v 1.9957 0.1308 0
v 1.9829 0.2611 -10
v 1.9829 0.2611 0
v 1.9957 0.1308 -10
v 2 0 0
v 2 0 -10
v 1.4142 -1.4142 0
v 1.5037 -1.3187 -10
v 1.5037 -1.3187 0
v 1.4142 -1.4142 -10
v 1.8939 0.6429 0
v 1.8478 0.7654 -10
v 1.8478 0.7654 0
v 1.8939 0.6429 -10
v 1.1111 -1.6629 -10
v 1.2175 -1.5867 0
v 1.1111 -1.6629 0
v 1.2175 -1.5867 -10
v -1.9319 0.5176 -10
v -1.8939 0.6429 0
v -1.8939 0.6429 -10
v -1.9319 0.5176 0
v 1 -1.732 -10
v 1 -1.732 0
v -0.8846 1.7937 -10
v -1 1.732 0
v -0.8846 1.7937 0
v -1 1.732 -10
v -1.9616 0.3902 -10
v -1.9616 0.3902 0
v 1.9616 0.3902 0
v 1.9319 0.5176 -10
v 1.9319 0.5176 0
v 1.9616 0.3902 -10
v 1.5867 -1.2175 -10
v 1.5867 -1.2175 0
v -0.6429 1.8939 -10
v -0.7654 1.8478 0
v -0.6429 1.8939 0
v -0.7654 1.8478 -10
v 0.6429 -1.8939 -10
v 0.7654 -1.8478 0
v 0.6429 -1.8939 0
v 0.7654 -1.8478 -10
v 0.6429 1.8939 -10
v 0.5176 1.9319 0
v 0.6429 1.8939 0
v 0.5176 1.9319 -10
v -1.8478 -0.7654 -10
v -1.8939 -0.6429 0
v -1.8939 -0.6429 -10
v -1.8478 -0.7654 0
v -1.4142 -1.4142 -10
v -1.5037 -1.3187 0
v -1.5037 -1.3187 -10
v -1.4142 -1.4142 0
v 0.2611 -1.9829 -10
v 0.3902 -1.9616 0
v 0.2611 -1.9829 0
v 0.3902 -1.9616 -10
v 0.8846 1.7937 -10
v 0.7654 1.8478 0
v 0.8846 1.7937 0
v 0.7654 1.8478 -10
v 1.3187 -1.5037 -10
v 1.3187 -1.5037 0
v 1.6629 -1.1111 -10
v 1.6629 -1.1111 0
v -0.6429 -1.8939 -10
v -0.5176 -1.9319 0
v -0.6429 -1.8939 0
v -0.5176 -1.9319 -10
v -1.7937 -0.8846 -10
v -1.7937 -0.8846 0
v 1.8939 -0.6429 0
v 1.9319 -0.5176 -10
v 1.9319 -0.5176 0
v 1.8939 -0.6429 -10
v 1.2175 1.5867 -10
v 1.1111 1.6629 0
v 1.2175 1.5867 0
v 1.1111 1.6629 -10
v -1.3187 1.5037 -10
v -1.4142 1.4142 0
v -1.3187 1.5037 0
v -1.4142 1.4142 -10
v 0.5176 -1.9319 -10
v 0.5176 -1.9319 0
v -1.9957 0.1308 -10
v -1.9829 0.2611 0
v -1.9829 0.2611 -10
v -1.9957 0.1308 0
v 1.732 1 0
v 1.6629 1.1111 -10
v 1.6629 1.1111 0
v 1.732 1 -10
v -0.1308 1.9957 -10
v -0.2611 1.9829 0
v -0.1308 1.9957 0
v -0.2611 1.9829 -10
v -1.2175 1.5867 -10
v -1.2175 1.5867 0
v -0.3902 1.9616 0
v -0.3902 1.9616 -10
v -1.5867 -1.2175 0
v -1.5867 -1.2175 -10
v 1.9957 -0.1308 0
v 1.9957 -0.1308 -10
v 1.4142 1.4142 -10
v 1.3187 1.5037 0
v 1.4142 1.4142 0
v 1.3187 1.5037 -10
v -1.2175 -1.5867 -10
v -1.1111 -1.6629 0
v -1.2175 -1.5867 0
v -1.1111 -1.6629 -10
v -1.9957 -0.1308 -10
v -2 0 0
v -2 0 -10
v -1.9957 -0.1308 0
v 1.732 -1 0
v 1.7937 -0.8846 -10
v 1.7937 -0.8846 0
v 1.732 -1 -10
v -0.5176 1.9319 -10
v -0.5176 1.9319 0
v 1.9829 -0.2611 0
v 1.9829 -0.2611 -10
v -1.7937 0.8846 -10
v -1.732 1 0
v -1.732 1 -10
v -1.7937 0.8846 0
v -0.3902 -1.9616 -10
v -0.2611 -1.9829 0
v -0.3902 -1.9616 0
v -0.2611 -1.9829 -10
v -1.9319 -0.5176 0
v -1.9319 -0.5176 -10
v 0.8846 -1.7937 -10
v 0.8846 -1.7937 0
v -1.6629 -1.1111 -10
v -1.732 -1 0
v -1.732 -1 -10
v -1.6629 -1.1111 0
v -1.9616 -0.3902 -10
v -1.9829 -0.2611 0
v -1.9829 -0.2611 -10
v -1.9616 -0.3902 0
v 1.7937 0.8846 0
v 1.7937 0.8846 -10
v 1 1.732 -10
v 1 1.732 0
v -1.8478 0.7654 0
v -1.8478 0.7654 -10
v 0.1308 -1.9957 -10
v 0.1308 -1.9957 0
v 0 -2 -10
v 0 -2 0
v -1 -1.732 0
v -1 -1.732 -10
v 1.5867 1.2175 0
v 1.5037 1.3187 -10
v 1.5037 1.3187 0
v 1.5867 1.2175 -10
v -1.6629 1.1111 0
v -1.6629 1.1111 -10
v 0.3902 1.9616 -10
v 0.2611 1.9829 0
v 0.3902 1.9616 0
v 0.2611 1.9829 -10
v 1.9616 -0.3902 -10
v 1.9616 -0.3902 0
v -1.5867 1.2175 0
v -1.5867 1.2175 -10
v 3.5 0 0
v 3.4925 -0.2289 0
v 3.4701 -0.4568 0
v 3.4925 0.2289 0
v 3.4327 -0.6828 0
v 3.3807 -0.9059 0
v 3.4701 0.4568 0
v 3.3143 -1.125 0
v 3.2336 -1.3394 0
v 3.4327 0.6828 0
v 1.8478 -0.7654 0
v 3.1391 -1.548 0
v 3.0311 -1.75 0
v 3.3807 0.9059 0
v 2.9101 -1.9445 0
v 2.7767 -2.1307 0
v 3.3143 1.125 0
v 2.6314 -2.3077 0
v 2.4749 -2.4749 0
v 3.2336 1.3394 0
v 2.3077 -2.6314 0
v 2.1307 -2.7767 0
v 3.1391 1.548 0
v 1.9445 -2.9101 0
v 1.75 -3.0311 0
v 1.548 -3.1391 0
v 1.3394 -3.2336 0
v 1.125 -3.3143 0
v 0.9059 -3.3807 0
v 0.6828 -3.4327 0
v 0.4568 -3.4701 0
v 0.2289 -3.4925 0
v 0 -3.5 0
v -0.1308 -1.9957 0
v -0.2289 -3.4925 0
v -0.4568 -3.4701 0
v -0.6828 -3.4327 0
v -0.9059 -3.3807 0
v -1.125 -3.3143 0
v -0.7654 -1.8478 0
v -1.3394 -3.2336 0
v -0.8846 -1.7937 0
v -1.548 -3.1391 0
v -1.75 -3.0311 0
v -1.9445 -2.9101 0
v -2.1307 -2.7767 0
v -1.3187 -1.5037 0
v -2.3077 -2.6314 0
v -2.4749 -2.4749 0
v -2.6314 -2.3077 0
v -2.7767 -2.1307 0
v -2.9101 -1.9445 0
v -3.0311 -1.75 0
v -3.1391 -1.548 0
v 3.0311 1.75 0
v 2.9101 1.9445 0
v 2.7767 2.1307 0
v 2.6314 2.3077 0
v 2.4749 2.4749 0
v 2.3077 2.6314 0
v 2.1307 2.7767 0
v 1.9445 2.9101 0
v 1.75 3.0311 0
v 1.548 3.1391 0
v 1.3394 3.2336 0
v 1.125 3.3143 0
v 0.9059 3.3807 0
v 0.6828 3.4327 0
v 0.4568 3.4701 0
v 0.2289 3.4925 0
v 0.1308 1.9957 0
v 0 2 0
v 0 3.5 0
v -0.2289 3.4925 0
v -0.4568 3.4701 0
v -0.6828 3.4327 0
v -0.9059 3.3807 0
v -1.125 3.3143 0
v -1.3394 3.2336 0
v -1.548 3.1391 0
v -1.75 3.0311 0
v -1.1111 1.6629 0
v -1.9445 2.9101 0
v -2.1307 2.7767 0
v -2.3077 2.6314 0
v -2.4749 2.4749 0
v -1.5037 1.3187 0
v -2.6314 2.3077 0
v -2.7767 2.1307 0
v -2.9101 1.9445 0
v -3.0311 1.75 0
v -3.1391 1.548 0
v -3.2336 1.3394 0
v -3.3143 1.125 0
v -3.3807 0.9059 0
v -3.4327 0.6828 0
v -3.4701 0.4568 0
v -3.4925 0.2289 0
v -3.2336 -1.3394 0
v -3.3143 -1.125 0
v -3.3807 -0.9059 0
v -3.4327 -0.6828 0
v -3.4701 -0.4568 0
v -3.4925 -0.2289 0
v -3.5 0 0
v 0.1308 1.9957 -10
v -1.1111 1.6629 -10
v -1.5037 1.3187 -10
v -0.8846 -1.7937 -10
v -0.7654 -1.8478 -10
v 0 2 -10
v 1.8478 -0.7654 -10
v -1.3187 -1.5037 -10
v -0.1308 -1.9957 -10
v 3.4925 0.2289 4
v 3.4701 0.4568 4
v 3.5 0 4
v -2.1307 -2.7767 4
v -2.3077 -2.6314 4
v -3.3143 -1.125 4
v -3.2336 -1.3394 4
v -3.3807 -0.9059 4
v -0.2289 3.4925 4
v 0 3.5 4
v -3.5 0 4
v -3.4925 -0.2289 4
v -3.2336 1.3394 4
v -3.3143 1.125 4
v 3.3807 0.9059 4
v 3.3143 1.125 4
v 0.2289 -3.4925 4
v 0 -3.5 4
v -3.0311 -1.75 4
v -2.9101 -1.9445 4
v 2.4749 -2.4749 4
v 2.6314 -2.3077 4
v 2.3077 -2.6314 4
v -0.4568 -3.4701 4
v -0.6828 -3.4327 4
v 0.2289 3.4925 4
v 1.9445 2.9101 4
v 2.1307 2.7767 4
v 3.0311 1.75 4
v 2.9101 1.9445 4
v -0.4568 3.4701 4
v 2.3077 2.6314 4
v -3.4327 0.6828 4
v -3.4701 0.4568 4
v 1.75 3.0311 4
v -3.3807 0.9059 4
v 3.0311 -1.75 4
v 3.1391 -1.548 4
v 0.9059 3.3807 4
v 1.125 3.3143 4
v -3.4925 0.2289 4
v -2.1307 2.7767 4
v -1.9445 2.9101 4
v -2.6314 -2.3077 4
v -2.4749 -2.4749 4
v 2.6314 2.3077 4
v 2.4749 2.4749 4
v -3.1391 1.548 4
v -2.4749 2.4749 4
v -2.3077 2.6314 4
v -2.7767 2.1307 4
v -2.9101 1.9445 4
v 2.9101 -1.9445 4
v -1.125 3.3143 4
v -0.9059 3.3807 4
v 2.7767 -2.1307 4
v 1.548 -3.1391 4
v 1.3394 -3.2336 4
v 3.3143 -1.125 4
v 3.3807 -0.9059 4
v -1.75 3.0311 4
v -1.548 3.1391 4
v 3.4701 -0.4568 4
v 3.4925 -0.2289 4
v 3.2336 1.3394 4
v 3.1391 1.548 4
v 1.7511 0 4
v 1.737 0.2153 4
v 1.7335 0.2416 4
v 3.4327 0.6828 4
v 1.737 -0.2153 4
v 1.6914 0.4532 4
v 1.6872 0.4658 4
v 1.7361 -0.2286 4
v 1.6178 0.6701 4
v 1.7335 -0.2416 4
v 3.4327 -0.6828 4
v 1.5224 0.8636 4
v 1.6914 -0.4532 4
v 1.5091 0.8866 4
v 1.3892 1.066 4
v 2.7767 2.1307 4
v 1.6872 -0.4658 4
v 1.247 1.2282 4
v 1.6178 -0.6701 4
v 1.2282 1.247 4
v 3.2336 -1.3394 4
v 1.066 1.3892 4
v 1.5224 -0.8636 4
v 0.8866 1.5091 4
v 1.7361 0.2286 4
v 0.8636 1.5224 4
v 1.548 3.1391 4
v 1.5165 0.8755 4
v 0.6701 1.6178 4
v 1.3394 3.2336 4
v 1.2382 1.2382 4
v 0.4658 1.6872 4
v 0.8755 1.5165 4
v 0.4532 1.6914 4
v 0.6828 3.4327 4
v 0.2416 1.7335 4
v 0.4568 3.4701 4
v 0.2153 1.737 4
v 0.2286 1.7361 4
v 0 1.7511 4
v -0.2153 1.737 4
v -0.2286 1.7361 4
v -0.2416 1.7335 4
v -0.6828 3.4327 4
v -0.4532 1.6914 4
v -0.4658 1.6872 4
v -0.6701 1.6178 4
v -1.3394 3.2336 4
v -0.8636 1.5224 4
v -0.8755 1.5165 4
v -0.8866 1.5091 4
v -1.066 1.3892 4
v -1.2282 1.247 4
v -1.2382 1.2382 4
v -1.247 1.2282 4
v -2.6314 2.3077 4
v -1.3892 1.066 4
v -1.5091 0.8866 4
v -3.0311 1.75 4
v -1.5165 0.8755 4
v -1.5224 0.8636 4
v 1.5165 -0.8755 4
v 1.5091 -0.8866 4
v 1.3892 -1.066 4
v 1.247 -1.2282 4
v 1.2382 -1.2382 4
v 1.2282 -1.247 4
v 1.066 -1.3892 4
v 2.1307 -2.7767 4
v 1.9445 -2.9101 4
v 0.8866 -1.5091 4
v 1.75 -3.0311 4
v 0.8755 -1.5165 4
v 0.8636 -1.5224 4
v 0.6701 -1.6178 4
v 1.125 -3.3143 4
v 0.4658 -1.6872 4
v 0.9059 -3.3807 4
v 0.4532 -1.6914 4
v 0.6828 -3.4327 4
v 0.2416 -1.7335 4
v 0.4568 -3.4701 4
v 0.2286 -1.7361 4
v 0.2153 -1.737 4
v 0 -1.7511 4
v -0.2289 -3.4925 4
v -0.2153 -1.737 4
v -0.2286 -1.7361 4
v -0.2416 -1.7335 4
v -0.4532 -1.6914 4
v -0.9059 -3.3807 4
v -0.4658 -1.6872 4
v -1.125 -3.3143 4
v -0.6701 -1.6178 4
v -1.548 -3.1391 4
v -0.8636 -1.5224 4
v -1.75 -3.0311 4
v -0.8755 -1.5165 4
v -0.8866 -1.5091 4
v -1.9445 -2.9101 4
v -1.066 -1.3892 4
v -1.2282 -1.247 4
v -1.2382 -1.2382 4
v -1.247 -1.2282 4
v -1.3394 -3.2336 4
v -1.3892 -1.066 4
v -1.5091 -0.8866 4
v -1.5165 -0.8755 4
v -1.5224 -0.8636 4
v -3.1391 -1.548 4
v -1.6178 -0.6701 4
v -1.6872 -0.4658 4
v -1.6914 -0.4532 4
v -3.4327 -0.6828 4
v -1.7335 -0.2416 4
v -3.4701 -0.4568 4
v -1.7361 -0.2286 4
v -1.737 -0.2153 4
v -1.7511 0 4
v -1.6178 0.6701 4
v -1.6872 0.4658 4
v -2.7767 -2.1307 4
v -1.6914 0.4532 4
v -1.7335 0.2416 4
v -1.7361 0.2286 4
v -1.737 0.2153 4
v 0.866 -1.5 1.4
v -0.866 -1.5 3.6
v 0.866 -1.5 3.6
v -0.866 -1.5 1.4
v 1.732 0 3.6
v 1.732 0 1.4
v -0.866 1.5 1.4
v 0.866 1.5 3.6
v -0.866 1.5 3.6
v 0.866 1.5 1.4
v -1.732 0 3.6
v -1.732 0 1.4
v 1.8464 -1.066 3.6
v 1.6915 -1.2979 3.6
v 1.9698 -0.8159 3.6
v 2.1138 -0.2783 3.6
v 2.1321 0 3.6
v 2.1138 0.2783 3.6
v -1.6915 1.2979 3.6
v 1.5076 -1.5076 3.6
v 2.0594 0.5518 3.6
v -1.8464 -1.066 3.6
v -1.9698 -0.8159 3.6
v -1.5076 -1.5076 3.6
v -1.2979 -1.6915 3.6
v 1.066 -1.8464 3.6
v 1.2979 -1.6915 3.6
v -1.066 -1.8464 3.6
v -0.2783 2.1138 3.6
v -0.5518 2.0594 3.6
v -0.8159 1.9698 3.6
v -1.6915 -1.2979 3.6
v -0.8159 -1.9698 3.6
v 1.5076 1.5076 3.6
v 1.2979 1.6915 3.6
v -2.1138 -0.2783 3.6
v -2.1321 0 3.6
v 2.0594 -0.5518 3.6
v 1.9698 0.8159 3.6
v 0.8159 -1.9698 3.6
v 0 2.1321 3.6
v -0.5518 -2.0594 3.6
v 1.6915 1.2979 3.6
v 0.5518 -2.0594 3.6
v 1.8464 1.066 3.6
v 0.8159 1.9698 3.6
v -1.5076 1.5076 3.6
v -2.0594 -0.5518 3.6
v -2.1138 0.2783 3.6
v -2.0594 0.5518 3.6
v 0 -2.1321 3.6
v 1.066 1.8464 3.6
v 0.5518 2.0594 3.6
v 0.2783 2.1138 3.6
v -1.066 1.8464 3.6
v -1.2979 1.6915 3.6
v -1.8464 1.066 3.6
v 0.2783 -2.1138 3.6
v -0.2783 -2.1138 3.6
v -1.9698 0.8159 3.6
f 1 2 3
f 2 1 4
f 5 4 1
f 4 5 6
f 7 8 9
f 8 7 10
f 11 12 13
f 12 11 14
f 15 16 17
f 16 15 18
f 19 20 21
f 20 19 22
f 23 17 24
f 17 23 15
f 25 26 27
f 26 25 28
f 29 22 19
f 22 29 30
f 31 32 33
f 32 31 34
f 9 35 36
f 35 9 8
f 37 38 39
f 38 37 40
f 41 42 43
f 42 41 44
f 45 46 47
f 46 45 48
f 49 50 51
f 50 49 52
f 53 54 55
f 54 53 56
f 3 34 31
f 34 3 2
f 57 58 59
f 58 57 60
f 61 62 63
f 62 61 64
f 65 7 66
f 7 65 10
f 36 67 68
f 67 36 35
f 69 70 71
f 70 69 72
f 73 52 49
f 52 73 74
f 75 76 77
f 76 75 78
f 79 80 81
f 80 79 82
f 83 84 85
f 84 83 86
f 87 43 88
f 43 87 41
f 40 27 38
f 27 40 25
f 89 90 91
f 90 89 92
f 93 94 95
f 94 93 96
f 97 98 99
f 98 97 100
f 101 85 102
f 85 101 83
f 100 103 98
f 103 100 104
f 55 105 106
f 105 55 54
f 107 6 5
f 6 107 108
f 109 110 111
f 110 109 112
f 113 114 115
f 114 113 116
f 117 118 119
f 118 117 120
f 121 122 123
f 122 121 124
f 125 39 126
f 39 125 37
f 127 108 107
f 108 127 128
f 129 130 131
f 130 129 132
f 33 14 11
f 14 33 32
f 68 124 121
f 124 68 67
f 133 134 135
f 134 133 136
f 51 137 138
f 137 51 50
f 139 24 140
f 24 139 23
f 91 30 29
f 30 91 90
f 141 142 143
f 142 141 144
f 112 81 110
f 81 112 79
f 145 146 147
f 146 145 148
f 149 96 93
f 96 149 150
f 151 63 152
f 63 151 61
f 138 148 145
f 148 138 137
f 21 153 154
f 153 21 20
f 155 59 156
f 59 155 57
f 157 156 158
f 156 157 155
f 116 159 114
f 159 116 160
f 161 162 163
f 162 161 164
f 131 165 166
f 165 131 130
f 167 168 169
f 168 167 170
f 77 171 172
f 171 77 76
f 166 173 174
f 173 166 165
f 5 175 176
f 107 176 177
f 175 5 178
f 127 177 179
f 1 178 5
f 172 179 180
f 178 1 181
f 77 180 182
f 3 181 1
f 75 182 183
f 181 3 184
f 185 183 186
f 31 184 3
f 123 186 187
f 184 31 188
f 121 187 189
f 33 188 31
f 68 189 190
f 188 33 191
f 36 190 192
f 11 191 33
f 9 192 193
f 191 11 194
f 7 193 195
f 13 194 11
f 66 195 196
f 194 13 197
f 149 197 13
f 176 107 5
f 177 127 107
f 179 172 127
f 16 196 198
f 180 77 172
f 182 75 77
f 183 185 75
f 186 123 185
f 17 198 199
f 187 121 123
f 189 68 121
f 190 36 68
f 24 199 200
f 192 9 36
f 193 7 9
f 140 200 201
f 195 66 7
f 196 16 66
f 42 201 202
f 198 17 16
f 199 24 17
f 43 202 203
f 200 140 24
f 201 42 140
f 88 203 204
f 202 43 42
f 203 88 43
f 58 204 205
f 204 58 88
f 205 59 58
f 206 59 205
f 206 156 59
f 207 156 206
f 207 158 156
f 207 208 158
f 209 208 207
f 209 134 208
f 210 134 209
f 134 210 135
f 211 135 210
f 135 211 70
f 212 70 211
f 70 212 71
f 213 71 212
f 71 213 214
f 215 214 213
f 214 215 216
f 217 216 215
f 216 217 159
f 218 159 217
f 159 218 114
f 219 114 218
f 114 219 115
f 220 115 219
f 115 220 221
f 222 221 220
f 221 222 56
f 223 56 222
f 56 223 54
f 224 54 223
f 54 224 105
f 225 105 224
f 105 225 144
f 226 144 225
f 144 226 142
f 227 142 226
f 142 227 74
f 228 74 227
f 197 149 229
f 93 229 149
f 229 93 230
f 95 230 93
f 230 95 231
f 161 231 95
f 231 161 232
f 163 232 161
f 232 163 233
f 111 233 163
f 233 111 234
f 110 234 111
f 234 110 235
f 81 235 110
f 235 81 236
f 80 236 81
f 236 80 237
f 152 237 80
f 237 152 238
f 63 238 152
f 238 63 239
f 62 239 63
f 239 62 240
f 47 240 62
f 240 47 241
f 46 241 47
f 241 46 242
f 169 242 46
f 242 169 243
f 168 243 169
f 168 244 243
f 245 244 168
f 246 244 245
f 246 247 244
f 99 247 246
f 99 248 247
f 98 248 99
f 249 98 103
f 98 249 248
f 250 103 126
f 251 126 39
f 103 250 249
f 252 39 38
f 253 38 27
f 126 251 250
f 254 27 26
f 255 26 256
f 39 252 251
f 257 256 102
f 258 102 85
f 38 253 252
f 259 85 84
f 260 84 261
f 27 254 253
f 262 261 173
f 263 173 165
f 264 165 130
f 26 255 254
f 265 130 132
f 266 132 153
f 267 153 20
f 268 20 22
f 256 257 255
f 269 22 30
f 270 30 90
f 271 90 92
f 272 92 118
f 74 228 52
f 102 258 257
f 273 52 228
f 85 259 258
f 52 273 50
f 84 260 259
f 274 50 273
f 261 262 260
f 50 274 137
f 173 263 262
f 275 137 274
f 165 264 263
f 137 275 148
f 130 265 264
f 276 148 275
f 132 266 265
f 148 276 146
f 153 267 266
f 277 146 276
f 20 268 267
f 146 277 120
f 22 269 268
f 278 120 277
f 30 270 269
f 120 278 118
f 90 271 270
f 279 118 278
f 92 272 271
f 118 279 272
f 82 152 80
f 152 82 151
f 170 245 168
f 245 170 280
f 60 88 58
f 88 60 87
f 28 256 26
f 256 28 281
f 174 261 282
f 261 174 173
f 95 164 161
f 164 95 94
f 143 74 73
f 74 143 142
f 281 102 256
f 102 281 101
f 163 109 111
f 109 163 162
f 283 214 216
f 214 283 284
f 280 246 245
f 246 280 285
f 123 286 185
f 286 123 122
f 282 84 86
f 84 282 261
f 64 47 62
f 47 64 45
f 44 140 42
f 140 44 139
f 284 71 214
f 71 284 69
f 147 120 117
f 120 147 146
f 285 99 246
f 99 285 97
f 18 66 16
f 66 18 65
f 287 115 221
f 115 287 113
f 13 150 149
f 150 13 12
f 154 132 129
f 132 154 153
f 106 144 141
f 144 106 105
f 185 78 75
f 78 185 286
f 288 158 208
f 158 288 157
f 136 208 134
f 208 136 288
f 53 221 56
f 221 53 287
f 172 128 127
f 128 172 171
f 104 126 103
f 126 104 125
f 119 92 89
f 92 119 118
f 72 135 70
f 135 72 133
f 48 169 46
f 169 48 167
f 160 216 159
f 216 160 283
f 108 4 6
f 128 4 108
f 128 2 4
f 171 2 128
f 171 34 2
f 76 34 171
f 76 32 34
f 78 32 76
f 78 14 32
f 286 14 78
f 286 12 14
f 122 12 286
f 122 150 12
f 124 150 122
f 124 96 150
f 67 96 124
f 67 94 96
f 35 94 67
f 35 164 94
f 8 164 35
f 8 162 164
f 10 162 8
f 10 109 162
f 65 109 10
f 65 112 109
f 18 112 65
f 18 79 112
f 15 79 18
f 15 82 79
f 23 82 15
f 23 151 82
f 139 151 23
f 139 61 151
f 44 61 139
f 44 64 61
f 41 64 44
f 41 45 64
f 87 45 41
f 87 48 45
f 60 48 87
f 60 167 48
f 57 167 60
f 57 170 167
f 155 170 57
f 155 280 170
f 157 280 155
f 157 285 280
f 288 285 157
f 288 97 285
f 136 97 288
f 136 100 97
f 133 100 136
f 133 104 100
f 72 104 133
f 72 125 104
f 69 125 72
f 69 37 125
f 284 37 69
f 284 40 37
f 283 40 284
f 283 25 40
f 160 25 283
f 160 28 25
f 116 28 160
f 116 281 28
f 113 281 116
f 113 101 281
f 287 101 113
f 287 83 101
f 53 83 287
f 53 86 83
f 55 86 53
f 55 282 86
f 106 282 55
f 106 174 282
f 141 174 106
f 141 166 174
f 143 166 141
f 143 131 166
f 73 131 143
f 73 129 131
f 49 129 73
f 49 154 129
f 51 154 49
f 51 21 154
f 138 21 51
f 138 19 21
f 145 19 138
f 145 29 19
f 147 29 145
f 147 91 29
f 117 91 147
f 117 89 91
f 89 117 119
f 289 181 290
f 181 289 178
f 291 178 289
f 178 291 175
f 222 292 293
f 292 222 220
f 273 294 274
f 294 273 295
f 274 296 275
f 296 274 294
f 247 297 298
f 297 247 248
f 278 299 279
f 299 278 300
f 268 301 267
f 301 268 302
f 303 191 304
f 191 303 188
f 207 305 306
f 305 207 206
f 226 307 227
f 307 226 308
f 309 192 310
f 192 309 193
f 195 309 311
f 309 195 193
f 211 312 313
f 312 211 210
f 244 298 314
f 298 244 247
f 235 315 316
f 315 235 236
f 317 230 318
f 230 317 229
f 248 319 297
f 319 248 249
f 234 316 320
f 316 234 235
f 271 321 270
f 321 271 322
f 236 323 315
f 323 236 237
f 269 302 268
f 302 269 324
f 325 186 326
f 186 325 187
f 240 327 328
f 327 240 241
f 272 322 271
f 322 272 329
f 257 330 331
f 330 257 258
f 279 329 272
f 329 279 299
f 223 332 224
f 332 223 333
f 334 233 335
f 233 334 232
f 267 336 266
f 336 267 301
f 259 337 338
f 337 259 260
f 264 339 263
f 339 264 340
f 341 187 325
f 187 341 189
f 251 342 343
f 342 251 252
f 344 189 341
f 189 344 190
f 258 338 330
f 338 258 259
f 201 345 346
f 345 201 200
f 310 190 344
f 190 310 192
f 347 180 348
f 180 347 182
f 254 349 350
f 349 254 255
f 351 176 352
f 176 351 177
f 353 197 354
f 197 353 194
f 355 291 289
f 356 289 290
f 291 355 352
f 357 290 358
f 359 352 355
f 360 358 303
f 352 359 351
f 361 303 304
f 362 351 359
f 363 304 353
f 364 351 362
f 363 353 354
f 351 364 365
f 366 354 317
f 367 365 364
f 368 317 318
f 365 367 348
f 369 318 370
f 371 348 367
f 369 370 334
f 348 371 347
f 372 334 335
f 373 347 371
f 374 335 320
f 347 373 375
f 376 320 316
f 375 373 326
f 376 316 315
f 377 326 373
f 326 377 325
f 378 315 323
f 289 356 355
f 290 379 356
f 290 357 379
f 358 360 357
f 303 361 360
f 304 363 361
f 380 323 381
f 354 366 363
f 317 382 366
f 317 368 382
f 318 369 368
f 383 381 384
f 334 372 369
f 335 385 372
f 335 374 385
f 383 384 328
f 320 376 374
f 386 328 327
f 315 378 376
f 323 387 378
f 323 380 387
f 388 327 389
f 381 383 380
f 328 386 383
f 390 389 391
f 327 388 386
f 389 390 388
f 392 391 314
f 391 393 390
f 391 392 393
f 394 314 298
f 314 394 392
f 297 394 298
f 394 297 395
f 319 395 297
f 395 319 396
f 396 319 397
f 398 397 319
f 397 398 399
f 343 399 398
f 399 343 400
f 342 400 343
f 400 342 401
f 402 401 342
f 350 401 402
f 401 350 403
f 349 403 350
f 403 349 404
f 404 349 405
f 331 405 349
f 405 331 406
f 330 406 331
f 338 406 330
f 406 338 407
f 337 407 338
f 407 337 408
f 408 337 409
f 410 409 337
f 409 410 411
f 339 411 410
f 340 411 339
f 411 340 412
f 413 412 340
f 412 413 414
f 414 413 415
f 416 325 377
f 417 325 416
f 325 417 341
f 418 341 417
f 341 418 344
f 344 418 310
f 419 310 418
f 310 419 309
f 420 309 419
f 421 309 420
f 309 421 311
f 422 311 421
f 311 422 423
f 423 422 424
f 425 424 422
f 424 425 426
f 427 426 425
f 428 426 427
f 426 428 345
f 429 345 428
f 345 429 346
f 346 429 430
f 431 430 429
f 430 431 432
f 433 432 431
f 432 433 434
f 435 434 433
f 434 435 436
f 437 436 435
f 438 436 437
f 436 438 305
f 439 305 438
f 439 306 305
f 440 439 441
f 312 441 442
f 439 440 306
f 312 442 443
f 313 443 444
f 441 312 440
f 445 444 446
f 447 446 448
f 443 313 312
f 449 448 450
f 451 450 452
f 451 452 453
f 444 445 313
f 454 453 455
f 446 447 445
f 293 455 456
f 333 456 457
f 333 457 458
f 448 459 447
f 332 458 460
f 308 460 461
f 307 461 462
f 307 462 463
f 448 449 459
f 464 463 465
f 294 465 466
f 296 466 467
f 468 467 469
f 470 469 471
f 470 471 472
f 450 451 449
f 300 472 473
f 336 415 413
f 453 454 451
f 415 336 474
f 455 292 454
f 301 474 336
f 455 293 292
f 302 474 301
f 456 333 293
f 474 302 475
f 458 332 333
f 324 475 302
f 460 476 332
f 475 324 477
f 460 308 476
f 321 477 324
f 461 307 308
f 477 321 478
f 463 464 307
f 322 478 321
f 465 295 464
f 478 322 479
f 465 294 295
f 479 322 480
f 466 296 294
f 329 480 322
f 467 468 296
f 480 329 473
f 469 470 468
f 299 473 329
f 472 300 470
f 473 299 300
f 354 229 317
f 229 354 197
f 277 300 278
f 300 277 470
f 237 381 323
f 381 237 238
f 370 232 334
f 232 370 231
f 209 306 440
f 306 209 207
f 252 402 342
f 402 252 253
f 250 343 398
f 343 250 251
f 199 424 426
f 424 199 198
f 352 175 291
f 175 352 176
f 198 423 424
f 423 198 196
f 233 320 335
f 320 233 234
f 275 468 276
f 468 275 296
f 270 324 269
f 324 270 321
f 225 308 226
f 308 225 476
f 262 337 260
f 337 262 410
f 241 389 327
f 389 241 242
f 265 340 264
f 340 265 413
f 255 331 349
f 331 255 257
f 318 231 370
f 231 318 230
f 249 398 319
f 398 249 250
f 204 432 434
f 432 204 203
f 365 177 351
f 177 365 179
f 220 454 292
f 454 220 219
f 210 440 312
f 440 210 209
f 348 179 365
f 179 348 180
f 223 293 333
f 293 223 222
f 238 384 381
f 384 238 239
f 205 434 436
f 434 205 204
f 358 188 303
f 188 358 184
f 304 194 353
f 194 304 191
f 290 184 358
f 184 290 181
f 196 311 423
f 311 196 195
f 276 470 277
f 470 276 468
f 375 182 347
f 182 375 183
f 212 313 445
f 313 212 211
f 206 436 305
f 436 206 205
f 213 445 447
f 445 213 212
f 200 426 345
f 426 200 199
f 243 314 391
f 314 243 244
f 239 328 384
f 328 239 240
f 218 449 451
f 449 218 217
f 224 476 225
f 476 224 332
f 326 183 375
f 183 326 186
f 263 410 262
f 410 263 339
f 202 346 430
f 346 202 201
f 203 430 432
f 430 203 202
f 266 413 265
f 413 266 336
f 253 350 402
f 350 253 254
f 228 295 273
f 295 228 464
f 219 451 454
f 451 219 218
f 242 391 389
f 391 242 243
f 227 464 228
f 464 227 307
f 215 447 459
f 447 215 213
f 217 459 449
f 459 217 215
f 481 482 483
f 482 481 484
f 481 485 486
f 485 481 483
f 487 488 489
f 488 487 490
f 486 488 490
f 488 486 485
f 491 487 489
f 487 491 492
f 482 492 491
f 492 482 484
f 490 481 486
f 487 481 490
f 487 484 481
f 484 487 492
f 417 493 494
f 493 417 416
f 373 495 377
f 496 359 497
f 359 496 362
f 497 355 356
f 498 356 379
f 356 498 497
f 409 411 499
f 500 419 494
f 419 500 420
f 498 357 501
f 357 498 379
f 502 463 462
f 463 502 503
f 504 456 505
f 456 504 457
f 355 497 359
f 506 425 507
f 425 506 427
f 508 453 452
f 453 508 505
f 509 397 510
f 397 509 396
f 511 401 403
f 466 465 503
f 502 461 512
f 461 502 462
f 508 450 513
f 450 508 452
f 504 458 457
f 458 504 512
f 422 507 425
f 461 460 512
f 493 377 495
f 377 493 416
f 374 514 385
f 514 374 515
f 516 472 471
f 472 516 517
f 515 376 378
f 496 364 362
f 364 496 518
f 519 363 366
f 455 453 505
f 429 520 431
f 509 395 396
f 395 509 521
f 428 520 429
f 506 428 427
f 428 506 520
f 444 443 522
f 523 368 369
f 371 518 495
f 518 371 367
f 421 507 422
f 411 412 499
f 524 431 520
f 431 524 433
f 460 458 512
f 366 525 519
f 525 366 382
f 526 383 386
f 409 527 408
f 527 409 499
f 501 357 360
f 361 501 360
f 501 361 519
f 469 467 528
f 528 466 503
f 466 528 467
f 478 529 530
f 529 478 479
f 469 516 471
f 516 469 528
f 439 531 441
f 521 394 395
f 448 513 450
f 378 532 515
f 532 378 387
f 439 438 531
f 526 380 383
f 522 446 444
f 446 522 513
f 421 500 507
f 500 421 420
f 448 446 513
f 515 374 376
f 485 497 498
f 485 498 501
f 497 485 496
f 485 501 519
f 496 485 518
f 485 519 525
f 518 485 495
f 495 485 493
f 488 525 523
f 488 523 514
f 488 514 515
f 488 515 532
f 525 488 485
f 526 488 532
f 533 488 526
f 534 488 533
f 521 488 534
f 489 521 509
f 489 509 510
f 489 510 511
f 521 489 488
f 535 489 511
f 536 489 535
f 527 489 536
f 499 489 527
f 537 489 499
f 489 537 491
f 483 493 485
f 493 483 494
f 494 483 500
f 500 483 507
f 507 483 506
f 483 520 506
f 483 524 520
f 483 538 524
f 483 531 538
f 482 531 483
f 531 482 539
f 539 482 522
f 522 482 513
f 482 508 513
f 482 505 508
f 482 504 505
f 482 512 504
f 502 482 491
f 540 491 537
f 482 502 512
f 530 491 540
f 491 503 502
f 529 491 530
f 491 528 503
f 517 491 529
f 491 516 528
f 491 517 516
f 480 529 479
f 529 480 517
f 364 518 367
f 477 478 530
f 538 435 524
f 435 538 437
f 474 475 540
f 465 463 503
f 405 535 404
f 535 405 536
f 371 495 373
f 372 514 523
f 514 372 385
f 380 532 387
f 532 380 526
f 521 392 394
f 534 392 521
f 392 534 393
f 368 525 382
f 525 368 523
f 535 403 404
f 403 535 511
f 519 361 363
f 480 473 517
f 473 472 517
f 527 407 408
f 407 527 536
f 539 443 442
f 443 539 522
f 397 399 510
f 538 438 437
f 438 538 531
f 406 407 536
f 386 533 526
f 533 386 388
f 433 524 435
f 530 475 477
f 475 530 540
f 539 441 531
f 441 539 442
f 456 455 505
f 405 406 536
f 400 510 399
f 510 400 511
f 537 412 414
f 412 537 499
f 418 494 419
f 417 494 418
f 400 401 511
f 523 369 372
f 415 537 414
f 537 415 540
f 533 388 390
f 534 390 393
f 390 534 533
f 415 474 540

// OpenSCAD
$fn = 96;

// Socket head cap screw (approximate)
// Shank diameter: 4.0 mm
// Head diameter: 7.0 mm
// Head height: 4.0 mm
// Overall length under head: 10.0 mm

d_shank = 4.0;
d_head  = 7.0;
h_head  = 4.0;
l_shank = 10.0;

// Hex socket (approximate for M4: 3 mm across flats)
socket_af = 3.0;
socket_depth = 2.6;
socket_entry_chamfer = 0.4;

// Small edge chamfers
head_top_chamfer = 0.35;
head_bottom_chamfer = 0.25;
tip_chamfer = 0.6;

module hex_prism(af, h) {
    // across flats = af => circumradius = af / sqrt(3)
    r = af / sqrt(3);
    cylinder(h=h, r=r, $fn=6);
}

module socket_head_cap_screw() {
    difference() {
        union() {
            // Shank (under head)
            translate([0,0,-l_shank])
                cylinder(h=l_shank, d=d_shank);

            // Tip chamfer
            translate([0,0,-l_shank])
                cylinder(h=tip_chamfer, d1=0.01, d2=d_shank);

            // Head body
            cylinder(h=h_head, d=d_head);

            // Head top chamfer
            translate([0,0,h_head-head_top_chamfer])
                cylinder(h=head_top_chamfer, d1=d_head, d2=d_head-2*head_top_chamfer);

            // Head bottom chamfer (at junction to shank)
            translate([0,0,0])
                cylinder(h=head_bottom_chamfer, d1=d_head-2*head_bottom_chamfer, d2=d_head);
        }

        // Hex socket cut
        translate([0,0,h_head - socket_depth])
            hex_prism(socket_af, socket_depth + 0.02);

        // Socket entry chamfer
        translate([0,0,h_head - socket_entry_chamfer])
            cylinder(h=socket_entry_chamfer + 0.02,
                     d1=(socket_af / sqrt(3))*2 + 2*socket_entry_chamfer,
                     d2=(socket_af / sqrt(3))*2,
                     $fn=48);
    }
}

socket_head_cap_screw();
